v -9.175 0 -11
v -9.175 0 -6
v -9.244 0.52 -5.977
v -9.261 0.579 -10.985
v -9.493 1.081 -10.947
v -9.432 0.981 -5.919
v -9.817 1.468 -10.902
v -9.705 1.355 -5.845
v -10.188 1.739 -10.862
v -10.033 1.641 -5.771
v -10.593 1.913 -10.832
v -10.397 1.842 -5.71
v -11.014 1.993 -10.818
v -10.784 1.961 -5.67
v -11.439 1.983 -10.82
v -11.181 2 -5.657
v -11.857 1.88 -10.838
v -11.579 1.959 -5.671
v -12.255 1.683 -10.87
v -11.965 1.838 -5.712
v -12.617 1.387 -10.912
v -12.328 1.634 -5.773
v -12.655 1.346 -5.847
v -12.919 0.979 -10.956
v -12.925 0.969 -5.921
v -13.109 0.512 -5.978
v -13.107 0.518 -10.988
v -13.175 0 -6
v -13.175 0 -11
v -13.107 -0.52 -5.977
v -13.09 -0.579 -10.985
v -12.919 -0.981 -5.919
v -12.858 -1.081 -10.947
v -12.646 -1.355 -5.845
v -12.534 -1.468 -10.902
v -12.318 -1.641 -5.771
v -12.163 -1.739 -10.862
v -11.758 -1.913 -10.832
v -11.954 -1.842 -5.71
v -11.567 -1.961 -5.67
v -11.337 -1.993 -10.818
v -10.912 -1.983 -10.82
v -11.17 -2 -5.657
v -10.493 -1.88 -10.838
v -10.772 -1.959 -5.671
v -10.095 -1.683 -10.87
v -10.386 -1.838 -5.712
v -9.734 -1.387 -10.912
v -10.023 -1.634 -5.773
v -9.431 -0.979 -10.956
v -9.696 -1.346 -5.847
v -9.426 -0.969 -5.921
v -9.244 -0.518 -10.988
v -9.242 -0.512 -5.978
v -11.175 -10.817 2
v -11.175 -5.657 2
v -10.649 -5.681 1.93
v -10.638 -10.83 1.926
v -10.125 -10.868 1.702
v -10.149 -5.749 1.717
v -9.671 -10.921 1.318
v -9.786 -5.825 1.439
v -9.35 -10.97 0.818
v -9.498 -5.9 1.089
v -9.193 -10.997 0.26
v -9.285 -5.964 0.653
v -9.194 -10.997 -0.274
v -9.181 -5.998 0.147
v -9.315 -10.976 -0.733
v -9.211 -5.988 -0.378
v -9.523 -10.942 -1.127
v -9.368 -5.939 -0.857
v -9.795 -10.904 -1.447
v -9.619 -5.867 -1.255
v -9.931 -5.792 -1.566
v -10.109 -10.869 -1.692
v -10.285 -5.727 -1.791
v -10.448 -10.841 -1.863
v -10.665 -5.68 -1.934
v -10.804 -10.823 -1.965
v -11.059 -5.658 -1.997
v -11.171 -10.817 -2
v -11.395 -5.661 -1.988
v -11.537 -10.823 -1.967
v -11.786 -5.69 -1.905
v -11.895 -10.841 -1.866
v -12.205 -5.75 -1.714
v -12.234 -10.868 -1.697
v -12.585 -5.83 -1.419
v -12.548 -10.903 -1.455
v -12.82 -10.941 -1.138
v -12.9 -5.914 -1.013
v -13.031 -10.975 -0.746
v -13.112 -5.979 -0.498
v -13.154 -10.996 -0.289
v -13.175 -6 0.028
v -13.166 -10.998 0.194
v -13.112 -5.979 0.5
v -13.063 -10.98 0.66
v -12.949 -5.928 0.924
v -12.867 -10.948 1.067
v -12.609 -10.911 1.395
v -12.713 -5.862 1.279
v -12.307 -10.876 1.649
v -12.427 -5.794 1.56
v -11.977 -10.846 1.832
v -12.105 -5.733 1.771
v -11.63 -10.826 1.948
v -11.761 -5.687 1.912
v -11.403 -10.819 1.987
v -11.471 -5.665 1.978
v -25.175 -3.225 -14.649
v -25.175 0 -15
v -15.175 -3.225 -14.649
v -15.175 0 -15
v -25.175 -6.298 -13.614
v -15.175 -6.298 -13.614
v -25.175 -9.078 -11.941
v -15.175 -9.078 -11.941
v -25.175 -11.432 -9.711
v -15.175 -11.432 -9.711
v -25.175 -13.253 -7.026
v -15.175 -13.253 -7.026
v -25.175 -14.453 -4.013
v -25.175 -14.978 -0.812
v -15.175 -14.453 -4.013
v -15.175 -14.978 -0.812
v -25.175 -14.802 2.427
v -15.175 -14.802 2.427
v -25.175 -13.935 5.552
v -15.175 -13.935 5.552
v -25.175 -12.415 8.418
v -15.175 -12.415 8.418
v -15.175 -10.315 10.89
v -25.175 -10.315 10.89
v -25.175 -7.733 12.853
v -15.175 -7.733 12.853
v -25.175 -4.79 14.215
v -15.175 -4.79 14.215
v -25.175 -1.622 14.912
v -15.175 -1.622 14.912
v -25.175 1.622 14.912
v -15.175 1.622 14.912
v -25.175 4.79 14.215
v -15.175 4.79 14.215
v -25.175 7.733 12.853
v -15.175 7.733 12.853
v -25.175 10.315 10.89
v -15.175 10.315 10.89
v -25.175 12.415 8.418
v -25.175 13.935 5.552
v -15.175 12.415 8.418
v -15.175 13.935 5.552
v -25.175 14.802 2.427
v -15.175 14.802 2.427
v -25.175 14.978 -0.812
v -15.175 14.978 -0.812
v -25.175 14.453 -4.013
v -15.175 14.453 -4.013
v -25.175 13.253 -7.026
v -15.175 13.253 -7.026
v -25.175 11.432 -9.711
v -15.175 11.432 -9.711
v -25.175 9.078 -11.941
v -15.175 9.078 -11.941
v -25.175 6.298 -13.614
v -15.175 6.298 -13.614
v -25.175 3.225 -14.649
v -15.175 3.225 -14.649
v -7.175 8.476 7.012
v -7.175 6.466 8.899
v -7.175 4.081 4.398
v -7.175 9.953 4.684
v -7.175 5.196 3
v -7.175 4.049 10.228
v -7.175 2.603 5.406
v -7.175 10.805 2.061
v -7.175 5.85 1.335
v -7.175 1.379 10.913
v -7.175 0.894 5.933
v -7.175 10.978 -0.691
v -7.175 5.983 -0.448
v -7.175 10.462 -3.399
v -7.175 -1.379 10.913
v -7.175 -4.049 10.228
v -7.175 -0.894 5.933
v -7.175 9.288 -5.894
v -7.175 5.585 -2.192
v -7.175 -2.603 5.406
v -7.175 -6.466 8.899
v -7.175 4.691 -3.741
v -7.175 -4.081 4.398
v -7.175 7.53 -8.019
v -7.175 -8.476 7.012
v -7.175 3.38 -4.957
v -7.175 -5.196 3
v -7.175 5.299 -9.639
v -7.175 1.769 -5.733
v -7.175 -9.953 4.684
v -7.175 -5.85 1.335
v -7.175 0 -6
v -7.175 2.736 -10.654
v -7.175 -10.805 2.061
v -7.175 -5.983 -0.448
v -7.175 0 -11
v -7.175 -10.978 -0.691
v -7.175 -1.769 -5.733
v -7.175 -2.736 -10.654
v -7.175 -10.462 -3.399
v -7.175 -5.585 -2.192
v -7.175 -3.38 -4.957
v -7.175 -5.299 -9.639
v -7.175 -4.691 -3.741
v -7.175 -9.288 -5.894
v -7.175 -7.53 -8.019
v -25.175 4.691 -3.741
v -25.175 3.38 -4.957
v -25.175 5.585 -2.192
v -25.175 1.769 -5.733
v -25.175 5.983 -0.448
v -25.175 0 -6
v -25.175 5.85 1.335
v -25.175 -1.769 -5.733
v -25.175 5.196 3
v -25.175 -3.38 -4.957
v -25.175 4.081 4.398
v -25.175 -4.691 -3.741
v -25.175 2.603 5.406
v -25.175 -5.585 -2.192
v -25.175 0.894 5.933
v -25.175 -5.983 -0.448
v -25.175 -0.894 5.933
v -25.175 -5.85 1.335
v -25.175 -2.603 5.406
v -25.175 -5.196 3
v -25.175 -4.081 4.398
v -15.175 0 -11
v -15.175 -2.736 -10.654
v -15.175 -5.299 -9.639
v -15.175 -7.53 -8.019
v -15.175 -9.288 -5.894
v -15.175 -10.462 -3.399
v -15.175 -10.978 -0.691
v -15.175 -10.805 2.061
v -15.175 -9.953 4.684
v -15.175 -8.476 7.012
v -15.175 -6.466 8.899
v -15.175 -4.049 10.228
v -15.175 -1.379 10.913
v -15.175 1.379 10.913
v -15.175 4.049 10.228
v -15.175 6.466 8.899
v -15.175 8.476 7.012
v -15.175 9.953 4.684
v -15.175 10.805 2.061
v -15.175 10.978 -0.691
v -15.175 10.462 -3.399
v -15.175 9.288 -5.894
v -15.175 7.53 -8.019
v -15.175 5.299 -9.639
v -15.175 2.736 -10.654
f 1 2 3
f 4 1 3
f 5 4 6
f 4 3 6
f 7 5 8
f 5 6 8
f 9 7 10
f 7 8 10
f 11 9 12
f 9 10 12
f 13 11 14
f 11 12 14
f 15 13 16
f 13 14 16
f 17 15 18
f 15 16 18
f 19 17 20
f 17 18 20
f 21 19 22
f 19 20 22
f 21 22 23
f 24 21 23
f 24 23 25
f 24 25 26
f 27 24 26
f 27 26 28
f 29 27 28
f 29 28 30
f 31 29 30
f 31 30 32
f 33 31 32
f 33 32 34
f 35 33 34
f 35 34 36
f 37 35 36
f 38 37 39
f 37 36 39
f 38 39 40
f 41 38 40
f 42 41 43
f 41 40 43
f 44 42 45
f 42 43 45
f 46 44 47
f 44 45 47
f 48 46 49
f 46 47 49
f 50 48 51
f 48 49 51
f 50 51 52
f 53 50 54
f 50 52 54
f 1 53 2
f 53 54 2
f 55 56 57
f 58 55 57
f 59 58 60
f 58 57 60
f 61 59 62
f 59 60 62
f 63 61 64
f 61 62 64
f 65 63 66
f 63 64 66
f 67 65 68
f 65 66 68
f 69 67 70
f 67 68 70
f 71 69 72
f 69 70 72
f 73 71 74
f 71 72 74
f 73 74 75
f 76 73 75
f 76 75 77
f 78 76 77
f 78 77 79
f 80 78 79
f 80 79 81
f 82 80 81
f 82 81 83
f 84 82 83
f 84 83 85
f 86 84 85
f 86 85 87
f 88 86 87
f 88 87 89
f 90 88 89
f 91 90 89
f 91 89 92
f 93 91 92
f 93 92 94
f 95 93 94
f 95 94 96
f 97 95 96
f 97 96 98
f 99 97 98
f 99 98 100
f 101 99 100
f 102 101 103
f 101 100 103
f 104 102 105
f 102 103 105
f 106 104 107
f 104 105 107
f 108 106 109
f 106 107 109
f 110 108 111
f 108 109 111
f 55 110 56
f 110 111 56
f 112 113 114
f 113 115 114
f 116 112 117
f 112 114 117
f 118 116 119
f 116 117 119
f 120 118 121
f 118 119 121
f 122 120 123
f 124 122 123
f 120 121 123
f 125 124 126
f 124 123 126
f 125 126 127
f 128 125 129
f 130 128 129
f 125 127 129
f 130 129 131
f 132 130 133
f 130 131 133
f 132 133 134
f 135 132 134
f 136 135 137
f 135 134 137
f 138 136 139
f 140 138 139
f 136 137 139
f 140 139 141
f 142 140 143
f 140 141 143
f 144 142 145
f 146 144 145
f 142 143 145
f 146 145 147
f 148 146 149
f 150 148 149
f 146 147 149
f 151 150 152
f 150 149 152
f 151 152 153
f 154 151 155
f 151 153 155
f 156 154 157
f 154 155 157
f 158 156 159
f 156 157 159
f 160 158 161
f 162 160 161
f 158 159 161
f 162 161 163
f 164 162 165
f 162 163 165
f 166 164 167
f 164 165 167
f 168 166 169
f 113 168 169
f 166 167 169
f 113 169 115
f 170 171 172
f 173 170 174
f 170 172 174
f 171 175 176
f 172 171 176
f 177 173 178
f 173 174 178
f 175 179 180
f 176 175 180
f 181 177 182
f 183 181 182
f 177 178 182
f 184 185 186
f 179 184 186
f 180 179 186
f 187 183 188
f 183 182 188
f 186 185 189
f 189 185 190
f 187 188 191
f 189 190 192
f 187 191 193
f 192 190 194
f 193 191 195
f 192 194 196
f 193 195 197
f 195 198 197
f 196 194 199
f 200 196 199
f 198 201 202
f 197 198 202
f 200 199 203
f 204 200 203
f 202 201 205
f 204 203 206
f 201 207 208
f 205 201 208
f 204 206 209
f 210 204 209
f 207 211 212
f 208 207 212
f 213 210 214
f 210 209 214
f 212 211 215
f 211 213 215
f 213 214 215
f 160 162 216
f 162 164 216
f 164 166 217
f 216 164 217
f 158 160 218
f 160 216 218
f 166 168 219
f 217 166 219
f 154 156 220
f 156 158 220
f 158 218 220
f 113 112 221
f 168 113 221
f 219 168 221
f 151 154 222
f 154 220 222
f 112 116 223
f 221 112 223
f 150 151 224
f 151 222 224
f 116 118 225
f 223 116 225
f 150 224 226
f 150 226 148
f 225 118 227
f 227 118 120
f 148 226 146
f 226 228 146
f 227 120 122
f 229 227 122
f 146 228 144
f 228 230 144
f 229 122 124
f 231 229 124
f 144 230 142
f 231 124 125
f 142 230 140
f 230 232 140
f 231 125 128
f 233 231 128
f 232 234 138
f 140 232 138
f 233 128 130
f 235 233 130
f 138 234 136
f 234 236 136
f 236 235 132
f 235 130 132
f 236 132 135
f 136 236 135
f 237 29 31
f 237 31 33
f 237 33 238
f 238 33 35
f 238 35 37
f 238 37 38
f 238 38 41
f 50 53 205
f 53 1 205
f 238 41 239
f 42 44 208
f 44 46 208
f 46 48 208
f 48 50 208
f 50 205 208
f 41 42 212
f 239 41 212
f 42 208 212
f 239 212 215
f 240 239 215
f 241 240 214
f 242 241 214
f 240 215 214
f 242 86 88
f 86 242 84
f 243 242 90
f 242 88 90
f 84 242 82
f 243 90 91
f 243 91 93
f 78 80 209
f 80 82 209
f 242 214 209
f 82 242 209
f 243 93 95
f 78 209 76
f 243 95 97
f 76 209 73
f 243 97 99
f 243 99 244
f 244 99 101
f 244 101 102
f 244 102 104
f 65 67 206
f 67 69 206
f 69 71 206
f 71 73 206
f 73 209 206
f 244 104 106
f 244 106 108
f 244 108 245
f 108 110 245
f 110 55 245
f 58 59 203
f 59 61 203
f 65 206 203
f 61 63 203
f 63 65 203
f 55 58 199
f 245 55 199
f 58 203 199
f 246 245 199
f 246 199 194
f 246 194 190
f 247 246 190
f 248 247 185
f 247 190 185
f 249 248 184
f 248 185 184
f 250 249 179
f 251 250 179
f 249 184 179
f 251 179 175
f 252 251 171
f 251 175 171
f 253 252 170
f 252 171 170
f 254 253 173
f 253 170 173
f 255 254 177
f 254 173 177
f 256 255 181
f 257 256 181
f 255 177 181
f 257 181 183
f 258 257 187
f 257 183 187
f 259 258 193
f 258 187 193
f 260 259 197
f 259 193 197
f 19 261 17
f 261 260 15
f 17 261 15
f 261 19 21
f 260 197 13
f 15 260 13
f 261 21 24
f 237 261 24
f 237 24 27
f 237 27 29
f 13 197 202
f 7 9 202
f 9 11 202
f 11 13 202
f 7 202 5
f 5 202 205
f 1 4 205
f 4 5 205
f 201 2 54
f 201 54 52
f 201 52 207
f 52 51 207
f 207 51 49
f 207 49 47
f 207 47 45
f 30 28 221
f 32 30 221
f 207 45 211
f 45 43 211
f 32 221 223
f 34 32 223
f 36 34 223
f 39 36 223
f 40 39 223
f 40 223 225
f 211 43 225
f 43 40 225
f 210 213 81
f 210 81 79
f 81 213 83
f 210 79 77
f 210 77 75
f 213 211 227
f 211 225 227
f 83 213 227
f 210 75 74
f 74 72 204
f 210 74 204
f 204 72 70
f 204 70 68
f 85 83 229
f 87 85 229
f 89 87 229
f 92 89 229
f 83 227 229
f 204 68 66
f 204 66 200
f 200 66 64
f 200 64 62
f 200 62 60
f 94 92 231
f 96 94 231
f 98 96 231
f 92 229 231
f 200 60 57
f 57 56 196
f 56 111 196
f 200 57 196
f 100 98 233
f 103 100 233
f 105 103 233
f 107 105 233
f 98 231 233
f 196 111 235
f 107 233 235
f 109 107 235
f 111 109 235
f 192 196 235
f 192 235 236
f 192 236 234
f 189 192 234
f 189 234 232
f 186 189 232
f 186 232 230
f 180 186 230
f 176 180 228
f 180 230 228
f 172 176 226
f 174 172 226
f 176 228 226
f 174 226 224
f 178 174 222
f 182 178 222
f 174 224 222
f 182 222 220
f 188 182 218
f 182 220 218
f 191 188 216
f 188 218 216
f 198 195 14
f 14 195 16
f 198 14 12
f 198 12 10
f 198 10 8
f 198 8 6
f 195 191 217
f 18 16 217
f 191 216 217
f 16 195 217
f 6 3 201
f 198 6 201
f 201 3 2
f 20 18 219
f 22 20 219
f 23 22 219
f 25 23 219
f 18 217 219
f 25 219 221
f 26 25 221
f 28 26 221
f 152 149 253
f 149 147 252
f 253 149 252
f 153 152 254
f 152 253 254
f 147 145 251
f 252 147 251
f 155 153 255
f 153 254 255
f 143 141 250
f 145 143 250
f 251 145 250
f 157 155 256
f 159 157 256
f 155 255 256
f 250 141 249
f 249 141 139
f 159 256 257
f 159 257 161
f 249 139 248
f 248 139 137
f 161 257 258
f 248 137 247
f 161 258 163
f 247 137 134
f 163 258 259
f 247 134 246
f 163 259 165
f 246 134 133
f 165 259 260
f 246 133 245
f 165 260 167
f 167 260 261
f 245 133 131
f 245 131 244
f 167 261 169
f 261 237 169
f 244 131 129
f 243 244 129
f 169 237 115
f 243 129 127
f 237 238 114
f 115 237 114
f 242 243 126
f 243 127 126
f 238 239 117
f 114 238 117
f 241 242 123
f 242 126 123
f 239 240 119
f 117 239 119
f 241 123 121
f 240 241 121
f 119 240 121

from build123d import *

# Parameters (mm, degrees)
SCHIZZO2_R               = 2
TAGLIO_ESTRUSIONE1_DEPTH = 33.921195442
SCHIZZO3_R               = 2
TAGLIO_ESTRUSIONE2_DEPTH = 33.921195518


with BuildPart() as part:
    # Schizzo1 → Rivoluzione1 (revolve)
    with BuildSketch(Plane.XY, mode=Mode.PRIVATE) as rivoluzione1_sk:
        Polygon((-25.175486278, 6), (-25.175486278, 15), (-15.175486278, 15), (-15.175486278, 11), (-7.175486278, 11), (-7.175486278, 6), align=None)
    revolve(rivoluzione1_sk.sketch.rotate(Axis((88.99, 0, 0), (-1, 0, 0)), 90), axis=Axis((88.99, 0, 0), (-1, 0, 0)))

    # Schizzo2 → Taglio-Estrusione1 (cut, through all)
    with BuildSketch(Plane.XY):
        with Locations((-11.175486278, 0)):
            Circle(SCHIZZO2_R)
    extrude(amount=-TAGLIO_ESTRUSIONE1_DEPTH, mode=Mode.SUBTRACT)

    # Schizzo3 → Taglio-Estrusione2 (cut, through all)
    with BuildSketch(Plane(origin=(0, 0, 0), x_dir=(1, 0, 0), z_dir=(0, 1, 0))):
        with Locations(Location((-11.175486278, 0, 0), (0, 0, 270))):
            Circle(SCHIZZO3_R)
    extrude(amount=-TAGLIO_ESTRUSIONE2_DEPTH, mode=Mode.SUBTRACT)


solid = part.part
